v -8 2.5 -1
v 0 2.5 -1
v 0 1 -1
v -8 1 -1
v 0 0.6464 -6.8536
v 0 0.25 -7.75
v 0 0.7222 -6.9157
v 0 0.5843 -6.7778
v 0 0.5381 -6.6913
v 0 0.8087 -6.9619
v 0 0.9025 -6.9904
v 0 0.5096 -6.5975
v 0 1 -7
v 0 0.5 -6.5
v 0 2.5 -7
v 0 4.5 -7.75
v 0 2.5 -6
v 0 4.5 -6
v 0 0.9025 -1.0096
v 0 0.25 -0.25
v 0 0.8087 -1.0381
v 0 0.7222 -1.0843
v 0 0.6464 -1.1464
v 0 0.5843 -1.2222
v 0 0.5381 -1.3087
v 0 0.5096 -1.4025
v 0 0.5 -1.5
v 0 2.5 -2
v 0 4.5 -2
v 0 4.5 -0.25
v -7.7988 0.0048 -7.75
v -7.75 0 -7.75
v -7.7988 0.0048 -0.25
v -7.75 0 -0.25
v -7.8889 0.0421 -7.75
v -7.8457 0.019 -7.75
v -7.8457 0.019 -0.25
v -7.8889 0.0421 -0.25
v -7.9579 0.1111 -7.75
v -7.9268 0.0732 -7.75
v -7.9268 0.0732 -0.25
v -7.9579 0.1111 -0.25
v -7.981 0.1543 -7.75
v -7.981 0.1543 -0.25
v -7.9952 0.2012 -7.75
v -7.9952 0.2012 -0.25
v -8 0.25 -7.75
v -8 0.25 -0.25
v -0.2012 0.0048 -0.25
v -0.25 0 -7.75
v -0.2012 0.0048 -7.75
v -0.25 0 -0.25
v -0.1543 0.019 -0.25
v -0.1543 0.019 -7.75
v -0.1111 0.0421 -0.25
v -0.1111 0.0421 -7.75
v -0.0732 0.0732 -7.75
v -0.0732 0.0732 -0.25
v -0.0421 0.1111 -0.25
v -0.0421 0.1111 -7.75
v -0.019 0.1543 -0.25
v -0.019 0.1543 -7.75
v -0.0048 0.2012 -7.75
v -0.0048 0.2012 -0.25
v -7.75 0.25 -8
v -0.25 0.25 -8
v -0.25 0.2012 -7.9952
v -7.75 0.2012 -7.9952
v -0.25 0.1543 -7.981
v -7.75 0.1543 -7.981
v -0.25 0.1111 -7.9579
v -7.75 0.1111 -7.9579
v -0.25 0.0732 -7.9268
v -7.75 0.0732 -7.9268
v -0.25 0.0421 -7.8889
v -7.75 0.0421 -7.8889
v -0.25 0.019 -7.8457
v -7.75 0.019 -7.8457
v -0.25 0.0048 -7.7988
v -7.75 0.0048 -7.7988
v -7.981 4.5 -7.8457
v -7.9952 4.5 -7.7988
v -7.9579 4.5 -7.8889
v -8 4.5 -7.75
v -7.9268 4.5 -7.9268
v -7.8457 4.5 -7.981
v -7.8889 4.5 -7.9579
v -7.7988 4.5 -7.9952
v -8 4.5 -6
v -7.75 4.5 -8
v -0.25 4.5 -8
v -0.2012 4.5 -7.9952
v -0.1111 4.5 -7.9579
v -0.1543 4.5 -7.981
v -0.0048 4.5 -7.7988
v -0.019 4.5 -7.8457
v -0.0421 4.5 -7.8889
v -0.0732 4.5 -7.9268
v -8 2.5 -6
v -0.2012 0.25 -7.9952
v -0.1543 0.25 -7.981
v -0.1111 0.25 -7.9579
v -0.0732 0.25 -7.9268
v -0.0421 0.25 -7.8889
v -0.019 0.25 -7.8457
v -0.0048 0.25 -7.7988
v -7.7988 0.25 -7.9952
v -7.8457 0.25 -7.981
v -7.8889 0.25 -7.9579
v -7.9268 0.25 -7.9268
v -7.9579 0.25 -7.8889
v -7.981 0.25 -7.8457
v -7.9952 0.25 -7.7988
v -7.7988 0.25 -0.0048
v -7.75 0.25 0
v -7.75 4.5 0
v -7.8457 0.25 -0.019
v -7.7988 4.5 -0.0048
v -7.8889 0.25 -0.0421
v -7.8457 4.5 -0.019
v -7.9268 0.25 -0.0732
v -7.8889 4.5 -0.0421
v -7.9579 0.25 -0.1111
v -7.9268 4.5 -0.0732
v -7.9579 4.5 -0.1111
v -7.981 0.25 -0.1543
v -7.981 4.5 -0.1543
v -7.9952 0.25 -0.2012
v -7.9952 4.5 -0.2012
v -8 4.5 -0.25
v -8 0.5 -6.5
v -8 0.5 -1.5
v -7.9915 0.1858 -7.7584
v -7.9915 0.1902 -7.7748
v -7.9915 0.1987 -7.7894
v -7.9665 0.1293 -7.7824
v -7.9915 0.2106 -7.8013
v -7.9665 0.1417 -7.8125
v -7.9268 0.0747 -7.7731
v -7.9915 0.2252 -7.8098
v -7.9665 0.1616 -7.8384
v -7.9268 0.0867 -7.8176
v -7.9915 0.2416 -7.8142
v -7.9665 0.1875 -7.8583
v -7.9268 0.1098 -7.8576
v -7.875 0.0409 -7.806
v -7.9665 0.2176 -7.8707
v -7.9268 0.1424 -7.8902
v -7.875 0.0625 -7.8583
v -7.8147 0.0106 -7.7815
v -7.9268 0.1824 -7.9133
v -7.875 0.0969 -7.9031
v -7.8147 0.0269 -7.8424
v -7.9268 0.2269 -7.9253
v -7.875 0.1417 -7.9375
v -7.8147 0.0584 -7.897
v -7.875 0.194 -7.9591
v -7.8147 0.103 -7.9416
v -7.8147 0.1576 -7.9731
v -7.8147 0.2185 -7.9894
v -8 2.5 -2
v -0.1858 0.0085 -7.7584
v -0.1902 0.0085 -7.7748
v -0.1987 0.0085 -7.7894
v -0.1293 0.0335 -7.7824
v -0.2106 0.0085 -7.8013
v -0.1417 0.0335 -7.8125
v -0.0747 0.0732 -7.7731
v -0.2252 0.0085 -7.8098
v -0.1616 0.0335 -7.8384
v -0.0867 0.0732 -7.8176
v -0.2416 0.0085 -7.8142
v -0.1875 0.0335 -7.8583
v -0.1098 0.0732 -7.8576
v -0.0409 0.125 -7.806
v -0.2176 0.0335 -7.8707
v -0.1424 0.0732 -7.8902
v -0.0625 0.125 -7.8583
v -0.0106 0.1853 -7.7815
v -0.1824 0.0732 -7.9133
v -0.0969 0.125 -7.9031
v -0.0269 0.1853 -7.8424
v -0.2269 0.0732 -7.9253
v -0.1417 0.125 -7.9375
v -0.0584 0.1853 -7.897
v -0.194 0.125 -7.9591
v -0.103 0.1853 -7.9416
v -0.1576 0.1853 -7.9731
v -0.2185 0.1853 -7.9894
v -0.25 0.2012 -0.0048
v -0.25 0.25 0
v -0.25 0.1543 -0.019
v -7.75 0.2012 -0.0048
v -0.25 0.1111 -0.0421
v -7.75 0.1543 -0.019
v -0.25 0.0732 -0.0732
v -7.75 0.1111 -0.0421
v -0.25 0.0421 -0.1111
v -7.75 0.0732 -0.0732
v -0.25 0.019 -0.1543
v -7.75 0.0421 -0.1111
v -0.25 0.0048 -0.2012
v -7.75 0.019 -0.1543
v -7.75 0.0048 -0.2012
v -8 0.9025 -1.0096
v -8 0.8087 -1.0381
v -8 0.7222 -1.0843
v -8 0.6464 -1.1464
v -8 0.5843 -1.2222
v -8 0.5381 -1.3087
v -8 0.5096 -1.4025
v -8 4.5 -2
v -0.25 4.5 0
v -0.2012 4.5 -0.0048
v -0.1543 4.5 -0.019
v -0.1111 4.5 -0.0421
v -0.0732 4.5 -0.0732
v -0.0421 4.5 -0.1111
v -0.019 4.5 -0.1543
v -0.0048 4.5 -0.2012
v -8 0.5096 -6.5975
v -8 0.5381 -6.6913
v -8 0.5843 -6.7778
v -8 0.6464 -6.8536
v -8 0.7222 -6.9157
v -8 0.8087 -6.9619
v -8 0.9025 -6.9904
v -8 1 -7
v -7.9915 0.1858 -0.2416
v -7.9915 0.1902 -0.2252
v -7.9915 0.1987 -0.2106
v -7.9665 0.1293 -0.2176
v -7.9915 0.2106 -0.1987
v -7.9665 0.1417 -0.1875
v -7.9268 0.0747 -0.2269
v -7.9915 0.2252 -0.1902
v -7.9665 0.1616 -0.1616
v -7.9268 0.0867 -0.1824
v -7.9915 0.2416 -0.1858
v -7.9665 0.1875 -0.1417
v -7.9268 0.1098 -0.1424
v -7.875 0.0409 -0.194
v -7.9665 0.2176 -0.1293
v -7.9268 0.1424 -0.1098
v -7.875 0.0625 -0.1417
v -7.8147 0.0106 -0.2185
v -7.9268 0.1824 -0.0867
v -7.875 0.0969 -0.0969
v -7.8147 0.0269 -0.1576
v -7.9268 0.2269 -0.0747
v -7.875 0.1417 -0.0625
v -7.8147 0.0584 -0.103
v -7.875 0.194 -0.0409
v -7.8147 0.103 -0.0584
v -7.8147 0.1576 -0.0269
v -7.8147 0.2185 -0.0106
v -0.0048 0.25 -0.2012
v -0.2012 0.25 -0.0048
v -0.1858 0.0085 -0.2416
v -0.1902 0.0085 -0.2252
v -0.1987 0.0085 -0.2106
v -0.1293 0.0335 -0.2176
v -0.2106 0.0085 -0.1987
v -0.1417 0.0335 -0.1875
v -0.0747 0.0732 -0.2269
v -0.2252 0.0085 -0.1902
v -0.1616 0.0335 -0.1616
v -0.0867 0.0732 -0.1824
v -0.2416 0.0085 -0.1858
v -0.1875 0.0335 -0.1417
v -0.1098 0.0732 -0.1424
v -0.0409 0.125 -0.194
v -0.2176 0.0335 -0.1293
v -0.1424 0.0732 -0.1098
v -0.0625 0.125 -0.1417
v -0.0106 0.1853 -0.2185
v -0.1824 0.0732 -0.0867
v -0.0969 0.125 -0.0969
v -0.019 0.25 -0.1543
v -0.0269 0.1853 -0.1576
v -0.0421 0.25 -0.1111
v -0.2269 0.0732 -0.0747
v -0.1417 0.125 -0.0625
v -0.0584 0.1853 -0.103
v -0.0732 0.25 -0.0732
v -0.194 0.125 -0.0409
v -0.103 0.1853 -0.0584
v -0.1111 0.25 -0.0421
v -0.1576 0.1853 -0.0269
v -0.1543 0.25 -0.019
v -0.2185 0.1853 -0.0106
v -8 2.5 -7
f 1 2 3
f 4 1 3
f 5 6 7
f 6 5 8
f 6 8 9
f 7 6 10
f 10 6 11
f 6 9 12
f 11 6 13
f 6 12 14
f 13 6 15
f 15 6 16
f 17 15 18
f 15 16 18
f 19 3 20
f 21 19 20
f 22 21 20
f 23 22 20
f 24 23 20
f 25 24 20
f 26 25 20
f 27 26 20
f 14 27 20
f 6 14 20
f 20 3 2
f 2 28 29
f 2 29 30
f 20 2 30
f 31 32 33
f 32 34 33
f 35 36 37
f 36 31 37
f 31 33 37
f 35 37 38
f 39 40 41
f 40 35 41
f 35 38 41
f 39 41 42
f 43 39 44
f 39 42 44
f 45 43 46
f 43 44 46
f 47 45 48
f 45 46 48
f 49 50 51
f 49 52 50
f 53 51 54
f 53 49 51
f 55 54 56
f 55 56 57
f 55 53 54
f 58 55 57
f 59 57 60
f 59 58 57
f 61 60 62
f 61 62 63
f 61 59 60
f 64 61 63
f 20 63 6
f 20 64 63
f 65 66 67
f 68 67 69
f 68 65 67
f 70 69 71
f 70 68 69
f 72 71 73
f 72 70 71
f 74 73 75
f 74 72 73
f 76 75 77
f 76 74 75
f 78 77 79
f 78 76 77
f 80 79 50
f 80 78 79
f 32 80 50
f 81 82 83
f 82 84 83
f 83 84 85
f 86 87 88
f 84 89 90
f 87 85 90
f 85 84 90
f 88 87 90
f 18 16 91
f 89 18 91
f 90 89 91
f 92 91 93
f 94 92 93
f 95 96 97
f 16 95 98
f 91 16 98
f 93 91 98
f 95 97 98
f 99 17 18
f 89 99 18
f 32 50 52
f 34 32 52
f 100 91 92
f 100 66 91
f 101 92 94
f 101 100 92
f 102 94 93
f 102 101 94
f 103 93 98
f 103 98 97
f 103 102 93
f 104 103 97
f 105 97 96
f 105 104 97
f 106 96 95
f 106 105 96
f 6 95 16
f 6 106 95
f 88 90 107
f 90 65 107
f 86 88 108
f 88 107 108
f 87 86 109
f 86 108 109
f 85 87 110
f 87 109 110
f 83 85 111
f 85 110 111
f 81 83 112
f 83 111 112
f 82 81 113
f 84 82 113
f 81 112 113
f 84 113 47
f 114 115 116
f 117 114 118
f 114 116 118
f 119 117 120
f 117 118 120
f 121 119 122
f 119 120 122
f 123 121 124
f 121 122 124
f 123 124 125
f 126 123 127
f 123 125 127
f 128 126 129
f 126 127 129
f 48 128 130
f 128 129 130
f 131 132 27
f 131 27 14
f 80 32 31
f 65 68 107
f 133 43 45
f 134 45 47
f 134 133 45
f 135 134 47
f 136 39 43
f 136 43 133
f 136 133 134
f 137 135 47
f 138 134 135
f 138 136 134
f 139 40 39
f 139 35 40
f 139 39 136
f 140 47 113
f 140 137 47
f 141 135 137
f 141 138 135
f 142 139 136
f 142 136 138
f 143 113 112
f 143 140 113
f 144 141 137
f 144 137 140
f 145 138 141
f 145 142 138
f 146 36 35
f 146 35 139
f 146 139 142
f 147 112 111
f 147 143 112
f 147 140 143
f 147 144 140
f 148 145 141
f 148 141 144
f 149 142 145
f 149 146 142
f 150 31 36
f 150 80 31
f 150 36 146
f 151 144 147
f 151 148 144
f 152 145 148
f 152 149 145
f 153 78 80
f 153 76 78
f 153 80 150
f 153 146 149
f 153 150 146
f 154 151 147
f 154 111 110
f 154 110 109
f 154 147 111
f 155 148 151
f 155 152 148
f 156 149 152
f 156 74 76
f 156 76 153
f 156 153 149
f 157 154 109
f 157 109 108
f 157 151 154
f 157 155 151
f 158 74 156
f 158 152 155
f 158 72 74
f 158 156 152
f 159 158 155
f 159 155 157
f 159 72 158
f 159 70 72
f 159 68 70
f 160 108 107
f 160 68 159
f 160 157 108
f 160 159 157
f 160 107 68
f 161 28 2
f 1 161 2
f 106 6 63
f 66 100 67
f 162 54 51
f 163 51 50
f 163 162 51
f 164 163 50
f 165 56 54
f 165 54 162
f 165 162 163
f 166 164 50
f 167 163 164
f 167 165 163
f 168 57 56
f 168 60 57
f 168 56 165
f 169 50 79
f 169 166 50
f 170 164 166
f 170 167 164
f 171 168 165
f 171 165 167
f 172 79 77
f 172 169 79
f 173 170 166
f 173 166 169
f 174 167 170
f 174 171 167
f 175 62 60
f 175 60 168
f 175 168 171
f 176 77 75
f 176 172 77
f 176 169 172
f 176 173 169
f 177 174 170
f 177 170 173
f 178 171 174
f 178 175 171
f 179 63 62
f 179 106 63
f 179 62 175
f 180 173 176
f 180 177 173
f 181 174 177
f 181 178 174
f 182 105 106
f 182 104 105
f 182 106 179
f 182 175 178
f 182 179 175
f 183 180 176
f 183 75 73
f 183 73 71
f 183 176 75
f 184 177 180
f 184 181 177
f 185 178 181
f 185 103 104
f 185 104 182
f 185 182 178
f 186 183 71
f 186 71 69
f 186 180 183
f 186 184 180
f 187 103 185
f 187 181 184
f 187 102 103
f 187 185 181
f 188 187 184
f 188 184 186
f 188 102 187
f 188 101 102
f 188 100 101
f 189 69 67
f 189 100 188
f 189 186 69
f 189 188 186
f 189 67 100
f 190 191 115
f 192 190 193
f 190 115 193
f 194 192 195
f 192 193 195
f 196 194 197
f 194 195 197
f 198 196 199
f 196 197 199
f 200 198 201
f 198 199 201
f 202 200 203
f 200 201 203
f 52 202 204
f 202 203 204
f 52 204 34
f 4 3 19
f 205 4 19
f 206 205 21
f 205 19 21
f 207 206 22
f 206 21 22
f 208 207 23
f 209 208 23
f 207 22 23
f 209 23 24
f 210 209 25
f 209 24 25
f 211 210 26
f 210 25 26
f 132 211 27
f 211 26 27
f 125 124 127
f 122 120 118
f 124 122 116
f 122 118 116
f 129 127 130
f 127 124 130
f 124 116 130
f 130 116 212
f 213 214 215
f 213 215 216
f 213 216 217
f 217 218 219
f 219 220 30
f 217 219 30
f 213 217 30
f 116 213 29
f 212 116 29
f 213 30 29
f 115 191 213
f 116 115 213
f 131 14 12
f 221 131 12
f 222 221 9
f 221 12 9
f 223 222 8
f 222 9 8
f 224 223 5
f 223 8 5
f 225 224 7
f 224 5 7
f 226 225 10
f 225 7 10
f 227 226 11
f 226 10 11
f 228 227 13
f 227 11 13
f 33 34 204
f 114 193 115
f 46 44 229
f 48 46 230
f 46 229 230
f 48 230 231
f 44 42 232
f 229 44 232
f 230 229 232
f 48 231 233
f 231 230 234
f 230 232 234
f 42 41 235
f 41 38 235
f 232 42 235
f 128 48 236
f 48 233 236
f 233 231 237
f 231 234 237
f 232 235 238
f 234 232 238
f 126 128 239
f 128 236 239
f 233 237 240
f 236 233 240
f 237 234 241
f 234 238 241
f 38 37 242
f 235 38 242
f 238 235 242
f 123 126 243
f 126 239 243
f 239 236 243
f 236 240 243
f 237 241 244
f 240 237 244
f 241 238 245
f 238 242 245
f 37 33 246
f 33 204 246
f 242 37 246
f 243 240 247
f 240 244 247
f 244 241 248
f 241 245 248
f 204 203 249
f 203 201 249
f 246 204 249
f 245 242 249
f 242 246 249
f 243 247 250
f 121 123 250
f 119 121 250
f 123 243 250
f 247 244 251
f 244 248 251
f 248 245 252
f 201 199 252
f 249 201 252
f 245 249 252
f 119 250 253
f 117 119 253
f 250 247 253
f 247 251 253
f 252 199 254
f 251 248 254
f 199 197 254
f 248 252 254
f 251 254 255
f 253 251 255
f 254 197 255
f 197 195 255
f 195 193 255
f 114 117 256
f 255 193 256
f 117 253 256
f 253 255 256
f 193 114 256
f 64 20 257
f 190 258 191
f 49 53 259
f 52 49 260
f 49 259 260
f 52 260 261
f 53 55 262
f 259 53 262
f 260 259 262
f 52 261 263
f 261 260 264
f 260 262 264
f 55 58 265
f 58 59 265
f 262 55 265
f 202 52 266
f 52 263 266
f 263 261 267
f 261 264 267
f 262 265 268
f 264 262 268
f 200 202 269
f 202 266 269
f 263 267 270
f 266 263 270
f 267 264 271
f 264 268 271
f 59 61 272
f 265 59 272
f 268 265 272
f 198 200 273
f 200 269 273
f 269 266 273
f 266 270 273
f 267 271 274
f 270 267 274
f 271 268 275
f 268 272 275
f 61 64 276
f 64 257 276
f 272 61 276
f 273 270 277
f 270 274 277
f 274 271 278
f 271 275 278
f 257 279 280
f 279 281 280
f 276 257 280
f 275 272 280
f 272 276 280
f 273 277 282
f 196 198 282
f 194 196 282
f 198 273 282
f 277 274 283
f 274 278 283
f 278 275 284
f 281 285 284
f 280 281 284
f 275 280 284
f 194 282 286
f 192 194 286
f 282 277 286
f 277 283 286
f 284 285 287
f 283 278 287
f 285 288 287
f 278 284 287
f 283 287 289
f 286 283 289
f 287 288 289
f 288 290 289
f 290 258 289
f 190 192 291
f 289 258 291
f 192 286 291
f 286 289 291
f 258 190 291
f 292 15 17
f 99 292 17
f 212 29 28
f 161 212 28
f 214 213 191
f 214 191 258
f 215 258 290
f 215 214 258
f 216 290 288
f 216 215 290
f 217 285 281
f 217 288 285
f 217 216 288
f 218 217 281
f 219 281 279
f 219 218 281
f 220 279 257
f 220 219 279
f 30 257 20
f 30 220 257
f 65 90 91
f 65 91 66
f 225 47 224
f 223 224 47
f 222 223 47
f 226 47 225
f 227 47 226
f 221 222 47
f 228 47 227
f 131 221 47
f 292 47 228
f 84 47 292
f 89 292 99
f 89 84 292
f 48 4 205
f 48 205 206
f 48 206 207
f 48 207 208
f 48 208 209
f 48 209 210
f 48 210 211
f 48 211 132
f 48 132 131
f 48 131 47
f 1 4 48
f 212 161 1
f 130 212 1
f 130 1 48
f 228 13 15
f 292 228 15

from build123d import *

# Parameters (mm, degrees)
EXTRUDE_1_DEPTH = 8
FILLET_1_R      = 0.25


with BuildPart() as part:
    # 草圖1 → 填料-伸長1 (new body)
    with BuildSketch(Plane(origin=(0, 0, 0), x_dir=(0, 0, -1), z_dir=(1, 0, 0))):
        with BuildLine():
            Line((0, 0), (0, 4.5))
            Line((0, 4.5), (2, 4.5))
            Line((2, 4.5), (2, 2.5))
            Line((2, 2.5), (1, 2.5))
            Line((1, 2.5), (1, 1))
            ThreePointArc((1, 1), (1.146446609, 0.646446609), (1.5, 0.5))
            Line((1.5, 0.5), (6.5, 0.5))
            ThreePointArc((6.5, 0.5), (6.853553391, 0.646446609), (7, 1))
            Line((7, 1), (7, 2.5))
            Line((7, 2.5), (6, 2.5))
            Line((6, 2.5), (6, 4.5))
            Line((6, 4.5), (8, 4.5))
            Line((8, 4.5), (8, 0))
            Line((8, 0), (0, 0))
        make_face()
    extrude(amount=-EXTRUDE_1_DEPTH)

    # 圓角1
    fillet_1_edges = [part.edges().sort_by_distance(p)[0] for p in [
        (0, 2.25, 0),
        (0, 2.25, -8),
        (0, 0, -4),
        (-4, 0, 0),
        (-4, 0, -8),
        (-8, 0, -4),
        (-8, 2.25, 0),
        (-8, 2.25, -8),
    ]]
    fillet(fillet_1_edges, radius=FILLET_1_R)


solid = part.part
